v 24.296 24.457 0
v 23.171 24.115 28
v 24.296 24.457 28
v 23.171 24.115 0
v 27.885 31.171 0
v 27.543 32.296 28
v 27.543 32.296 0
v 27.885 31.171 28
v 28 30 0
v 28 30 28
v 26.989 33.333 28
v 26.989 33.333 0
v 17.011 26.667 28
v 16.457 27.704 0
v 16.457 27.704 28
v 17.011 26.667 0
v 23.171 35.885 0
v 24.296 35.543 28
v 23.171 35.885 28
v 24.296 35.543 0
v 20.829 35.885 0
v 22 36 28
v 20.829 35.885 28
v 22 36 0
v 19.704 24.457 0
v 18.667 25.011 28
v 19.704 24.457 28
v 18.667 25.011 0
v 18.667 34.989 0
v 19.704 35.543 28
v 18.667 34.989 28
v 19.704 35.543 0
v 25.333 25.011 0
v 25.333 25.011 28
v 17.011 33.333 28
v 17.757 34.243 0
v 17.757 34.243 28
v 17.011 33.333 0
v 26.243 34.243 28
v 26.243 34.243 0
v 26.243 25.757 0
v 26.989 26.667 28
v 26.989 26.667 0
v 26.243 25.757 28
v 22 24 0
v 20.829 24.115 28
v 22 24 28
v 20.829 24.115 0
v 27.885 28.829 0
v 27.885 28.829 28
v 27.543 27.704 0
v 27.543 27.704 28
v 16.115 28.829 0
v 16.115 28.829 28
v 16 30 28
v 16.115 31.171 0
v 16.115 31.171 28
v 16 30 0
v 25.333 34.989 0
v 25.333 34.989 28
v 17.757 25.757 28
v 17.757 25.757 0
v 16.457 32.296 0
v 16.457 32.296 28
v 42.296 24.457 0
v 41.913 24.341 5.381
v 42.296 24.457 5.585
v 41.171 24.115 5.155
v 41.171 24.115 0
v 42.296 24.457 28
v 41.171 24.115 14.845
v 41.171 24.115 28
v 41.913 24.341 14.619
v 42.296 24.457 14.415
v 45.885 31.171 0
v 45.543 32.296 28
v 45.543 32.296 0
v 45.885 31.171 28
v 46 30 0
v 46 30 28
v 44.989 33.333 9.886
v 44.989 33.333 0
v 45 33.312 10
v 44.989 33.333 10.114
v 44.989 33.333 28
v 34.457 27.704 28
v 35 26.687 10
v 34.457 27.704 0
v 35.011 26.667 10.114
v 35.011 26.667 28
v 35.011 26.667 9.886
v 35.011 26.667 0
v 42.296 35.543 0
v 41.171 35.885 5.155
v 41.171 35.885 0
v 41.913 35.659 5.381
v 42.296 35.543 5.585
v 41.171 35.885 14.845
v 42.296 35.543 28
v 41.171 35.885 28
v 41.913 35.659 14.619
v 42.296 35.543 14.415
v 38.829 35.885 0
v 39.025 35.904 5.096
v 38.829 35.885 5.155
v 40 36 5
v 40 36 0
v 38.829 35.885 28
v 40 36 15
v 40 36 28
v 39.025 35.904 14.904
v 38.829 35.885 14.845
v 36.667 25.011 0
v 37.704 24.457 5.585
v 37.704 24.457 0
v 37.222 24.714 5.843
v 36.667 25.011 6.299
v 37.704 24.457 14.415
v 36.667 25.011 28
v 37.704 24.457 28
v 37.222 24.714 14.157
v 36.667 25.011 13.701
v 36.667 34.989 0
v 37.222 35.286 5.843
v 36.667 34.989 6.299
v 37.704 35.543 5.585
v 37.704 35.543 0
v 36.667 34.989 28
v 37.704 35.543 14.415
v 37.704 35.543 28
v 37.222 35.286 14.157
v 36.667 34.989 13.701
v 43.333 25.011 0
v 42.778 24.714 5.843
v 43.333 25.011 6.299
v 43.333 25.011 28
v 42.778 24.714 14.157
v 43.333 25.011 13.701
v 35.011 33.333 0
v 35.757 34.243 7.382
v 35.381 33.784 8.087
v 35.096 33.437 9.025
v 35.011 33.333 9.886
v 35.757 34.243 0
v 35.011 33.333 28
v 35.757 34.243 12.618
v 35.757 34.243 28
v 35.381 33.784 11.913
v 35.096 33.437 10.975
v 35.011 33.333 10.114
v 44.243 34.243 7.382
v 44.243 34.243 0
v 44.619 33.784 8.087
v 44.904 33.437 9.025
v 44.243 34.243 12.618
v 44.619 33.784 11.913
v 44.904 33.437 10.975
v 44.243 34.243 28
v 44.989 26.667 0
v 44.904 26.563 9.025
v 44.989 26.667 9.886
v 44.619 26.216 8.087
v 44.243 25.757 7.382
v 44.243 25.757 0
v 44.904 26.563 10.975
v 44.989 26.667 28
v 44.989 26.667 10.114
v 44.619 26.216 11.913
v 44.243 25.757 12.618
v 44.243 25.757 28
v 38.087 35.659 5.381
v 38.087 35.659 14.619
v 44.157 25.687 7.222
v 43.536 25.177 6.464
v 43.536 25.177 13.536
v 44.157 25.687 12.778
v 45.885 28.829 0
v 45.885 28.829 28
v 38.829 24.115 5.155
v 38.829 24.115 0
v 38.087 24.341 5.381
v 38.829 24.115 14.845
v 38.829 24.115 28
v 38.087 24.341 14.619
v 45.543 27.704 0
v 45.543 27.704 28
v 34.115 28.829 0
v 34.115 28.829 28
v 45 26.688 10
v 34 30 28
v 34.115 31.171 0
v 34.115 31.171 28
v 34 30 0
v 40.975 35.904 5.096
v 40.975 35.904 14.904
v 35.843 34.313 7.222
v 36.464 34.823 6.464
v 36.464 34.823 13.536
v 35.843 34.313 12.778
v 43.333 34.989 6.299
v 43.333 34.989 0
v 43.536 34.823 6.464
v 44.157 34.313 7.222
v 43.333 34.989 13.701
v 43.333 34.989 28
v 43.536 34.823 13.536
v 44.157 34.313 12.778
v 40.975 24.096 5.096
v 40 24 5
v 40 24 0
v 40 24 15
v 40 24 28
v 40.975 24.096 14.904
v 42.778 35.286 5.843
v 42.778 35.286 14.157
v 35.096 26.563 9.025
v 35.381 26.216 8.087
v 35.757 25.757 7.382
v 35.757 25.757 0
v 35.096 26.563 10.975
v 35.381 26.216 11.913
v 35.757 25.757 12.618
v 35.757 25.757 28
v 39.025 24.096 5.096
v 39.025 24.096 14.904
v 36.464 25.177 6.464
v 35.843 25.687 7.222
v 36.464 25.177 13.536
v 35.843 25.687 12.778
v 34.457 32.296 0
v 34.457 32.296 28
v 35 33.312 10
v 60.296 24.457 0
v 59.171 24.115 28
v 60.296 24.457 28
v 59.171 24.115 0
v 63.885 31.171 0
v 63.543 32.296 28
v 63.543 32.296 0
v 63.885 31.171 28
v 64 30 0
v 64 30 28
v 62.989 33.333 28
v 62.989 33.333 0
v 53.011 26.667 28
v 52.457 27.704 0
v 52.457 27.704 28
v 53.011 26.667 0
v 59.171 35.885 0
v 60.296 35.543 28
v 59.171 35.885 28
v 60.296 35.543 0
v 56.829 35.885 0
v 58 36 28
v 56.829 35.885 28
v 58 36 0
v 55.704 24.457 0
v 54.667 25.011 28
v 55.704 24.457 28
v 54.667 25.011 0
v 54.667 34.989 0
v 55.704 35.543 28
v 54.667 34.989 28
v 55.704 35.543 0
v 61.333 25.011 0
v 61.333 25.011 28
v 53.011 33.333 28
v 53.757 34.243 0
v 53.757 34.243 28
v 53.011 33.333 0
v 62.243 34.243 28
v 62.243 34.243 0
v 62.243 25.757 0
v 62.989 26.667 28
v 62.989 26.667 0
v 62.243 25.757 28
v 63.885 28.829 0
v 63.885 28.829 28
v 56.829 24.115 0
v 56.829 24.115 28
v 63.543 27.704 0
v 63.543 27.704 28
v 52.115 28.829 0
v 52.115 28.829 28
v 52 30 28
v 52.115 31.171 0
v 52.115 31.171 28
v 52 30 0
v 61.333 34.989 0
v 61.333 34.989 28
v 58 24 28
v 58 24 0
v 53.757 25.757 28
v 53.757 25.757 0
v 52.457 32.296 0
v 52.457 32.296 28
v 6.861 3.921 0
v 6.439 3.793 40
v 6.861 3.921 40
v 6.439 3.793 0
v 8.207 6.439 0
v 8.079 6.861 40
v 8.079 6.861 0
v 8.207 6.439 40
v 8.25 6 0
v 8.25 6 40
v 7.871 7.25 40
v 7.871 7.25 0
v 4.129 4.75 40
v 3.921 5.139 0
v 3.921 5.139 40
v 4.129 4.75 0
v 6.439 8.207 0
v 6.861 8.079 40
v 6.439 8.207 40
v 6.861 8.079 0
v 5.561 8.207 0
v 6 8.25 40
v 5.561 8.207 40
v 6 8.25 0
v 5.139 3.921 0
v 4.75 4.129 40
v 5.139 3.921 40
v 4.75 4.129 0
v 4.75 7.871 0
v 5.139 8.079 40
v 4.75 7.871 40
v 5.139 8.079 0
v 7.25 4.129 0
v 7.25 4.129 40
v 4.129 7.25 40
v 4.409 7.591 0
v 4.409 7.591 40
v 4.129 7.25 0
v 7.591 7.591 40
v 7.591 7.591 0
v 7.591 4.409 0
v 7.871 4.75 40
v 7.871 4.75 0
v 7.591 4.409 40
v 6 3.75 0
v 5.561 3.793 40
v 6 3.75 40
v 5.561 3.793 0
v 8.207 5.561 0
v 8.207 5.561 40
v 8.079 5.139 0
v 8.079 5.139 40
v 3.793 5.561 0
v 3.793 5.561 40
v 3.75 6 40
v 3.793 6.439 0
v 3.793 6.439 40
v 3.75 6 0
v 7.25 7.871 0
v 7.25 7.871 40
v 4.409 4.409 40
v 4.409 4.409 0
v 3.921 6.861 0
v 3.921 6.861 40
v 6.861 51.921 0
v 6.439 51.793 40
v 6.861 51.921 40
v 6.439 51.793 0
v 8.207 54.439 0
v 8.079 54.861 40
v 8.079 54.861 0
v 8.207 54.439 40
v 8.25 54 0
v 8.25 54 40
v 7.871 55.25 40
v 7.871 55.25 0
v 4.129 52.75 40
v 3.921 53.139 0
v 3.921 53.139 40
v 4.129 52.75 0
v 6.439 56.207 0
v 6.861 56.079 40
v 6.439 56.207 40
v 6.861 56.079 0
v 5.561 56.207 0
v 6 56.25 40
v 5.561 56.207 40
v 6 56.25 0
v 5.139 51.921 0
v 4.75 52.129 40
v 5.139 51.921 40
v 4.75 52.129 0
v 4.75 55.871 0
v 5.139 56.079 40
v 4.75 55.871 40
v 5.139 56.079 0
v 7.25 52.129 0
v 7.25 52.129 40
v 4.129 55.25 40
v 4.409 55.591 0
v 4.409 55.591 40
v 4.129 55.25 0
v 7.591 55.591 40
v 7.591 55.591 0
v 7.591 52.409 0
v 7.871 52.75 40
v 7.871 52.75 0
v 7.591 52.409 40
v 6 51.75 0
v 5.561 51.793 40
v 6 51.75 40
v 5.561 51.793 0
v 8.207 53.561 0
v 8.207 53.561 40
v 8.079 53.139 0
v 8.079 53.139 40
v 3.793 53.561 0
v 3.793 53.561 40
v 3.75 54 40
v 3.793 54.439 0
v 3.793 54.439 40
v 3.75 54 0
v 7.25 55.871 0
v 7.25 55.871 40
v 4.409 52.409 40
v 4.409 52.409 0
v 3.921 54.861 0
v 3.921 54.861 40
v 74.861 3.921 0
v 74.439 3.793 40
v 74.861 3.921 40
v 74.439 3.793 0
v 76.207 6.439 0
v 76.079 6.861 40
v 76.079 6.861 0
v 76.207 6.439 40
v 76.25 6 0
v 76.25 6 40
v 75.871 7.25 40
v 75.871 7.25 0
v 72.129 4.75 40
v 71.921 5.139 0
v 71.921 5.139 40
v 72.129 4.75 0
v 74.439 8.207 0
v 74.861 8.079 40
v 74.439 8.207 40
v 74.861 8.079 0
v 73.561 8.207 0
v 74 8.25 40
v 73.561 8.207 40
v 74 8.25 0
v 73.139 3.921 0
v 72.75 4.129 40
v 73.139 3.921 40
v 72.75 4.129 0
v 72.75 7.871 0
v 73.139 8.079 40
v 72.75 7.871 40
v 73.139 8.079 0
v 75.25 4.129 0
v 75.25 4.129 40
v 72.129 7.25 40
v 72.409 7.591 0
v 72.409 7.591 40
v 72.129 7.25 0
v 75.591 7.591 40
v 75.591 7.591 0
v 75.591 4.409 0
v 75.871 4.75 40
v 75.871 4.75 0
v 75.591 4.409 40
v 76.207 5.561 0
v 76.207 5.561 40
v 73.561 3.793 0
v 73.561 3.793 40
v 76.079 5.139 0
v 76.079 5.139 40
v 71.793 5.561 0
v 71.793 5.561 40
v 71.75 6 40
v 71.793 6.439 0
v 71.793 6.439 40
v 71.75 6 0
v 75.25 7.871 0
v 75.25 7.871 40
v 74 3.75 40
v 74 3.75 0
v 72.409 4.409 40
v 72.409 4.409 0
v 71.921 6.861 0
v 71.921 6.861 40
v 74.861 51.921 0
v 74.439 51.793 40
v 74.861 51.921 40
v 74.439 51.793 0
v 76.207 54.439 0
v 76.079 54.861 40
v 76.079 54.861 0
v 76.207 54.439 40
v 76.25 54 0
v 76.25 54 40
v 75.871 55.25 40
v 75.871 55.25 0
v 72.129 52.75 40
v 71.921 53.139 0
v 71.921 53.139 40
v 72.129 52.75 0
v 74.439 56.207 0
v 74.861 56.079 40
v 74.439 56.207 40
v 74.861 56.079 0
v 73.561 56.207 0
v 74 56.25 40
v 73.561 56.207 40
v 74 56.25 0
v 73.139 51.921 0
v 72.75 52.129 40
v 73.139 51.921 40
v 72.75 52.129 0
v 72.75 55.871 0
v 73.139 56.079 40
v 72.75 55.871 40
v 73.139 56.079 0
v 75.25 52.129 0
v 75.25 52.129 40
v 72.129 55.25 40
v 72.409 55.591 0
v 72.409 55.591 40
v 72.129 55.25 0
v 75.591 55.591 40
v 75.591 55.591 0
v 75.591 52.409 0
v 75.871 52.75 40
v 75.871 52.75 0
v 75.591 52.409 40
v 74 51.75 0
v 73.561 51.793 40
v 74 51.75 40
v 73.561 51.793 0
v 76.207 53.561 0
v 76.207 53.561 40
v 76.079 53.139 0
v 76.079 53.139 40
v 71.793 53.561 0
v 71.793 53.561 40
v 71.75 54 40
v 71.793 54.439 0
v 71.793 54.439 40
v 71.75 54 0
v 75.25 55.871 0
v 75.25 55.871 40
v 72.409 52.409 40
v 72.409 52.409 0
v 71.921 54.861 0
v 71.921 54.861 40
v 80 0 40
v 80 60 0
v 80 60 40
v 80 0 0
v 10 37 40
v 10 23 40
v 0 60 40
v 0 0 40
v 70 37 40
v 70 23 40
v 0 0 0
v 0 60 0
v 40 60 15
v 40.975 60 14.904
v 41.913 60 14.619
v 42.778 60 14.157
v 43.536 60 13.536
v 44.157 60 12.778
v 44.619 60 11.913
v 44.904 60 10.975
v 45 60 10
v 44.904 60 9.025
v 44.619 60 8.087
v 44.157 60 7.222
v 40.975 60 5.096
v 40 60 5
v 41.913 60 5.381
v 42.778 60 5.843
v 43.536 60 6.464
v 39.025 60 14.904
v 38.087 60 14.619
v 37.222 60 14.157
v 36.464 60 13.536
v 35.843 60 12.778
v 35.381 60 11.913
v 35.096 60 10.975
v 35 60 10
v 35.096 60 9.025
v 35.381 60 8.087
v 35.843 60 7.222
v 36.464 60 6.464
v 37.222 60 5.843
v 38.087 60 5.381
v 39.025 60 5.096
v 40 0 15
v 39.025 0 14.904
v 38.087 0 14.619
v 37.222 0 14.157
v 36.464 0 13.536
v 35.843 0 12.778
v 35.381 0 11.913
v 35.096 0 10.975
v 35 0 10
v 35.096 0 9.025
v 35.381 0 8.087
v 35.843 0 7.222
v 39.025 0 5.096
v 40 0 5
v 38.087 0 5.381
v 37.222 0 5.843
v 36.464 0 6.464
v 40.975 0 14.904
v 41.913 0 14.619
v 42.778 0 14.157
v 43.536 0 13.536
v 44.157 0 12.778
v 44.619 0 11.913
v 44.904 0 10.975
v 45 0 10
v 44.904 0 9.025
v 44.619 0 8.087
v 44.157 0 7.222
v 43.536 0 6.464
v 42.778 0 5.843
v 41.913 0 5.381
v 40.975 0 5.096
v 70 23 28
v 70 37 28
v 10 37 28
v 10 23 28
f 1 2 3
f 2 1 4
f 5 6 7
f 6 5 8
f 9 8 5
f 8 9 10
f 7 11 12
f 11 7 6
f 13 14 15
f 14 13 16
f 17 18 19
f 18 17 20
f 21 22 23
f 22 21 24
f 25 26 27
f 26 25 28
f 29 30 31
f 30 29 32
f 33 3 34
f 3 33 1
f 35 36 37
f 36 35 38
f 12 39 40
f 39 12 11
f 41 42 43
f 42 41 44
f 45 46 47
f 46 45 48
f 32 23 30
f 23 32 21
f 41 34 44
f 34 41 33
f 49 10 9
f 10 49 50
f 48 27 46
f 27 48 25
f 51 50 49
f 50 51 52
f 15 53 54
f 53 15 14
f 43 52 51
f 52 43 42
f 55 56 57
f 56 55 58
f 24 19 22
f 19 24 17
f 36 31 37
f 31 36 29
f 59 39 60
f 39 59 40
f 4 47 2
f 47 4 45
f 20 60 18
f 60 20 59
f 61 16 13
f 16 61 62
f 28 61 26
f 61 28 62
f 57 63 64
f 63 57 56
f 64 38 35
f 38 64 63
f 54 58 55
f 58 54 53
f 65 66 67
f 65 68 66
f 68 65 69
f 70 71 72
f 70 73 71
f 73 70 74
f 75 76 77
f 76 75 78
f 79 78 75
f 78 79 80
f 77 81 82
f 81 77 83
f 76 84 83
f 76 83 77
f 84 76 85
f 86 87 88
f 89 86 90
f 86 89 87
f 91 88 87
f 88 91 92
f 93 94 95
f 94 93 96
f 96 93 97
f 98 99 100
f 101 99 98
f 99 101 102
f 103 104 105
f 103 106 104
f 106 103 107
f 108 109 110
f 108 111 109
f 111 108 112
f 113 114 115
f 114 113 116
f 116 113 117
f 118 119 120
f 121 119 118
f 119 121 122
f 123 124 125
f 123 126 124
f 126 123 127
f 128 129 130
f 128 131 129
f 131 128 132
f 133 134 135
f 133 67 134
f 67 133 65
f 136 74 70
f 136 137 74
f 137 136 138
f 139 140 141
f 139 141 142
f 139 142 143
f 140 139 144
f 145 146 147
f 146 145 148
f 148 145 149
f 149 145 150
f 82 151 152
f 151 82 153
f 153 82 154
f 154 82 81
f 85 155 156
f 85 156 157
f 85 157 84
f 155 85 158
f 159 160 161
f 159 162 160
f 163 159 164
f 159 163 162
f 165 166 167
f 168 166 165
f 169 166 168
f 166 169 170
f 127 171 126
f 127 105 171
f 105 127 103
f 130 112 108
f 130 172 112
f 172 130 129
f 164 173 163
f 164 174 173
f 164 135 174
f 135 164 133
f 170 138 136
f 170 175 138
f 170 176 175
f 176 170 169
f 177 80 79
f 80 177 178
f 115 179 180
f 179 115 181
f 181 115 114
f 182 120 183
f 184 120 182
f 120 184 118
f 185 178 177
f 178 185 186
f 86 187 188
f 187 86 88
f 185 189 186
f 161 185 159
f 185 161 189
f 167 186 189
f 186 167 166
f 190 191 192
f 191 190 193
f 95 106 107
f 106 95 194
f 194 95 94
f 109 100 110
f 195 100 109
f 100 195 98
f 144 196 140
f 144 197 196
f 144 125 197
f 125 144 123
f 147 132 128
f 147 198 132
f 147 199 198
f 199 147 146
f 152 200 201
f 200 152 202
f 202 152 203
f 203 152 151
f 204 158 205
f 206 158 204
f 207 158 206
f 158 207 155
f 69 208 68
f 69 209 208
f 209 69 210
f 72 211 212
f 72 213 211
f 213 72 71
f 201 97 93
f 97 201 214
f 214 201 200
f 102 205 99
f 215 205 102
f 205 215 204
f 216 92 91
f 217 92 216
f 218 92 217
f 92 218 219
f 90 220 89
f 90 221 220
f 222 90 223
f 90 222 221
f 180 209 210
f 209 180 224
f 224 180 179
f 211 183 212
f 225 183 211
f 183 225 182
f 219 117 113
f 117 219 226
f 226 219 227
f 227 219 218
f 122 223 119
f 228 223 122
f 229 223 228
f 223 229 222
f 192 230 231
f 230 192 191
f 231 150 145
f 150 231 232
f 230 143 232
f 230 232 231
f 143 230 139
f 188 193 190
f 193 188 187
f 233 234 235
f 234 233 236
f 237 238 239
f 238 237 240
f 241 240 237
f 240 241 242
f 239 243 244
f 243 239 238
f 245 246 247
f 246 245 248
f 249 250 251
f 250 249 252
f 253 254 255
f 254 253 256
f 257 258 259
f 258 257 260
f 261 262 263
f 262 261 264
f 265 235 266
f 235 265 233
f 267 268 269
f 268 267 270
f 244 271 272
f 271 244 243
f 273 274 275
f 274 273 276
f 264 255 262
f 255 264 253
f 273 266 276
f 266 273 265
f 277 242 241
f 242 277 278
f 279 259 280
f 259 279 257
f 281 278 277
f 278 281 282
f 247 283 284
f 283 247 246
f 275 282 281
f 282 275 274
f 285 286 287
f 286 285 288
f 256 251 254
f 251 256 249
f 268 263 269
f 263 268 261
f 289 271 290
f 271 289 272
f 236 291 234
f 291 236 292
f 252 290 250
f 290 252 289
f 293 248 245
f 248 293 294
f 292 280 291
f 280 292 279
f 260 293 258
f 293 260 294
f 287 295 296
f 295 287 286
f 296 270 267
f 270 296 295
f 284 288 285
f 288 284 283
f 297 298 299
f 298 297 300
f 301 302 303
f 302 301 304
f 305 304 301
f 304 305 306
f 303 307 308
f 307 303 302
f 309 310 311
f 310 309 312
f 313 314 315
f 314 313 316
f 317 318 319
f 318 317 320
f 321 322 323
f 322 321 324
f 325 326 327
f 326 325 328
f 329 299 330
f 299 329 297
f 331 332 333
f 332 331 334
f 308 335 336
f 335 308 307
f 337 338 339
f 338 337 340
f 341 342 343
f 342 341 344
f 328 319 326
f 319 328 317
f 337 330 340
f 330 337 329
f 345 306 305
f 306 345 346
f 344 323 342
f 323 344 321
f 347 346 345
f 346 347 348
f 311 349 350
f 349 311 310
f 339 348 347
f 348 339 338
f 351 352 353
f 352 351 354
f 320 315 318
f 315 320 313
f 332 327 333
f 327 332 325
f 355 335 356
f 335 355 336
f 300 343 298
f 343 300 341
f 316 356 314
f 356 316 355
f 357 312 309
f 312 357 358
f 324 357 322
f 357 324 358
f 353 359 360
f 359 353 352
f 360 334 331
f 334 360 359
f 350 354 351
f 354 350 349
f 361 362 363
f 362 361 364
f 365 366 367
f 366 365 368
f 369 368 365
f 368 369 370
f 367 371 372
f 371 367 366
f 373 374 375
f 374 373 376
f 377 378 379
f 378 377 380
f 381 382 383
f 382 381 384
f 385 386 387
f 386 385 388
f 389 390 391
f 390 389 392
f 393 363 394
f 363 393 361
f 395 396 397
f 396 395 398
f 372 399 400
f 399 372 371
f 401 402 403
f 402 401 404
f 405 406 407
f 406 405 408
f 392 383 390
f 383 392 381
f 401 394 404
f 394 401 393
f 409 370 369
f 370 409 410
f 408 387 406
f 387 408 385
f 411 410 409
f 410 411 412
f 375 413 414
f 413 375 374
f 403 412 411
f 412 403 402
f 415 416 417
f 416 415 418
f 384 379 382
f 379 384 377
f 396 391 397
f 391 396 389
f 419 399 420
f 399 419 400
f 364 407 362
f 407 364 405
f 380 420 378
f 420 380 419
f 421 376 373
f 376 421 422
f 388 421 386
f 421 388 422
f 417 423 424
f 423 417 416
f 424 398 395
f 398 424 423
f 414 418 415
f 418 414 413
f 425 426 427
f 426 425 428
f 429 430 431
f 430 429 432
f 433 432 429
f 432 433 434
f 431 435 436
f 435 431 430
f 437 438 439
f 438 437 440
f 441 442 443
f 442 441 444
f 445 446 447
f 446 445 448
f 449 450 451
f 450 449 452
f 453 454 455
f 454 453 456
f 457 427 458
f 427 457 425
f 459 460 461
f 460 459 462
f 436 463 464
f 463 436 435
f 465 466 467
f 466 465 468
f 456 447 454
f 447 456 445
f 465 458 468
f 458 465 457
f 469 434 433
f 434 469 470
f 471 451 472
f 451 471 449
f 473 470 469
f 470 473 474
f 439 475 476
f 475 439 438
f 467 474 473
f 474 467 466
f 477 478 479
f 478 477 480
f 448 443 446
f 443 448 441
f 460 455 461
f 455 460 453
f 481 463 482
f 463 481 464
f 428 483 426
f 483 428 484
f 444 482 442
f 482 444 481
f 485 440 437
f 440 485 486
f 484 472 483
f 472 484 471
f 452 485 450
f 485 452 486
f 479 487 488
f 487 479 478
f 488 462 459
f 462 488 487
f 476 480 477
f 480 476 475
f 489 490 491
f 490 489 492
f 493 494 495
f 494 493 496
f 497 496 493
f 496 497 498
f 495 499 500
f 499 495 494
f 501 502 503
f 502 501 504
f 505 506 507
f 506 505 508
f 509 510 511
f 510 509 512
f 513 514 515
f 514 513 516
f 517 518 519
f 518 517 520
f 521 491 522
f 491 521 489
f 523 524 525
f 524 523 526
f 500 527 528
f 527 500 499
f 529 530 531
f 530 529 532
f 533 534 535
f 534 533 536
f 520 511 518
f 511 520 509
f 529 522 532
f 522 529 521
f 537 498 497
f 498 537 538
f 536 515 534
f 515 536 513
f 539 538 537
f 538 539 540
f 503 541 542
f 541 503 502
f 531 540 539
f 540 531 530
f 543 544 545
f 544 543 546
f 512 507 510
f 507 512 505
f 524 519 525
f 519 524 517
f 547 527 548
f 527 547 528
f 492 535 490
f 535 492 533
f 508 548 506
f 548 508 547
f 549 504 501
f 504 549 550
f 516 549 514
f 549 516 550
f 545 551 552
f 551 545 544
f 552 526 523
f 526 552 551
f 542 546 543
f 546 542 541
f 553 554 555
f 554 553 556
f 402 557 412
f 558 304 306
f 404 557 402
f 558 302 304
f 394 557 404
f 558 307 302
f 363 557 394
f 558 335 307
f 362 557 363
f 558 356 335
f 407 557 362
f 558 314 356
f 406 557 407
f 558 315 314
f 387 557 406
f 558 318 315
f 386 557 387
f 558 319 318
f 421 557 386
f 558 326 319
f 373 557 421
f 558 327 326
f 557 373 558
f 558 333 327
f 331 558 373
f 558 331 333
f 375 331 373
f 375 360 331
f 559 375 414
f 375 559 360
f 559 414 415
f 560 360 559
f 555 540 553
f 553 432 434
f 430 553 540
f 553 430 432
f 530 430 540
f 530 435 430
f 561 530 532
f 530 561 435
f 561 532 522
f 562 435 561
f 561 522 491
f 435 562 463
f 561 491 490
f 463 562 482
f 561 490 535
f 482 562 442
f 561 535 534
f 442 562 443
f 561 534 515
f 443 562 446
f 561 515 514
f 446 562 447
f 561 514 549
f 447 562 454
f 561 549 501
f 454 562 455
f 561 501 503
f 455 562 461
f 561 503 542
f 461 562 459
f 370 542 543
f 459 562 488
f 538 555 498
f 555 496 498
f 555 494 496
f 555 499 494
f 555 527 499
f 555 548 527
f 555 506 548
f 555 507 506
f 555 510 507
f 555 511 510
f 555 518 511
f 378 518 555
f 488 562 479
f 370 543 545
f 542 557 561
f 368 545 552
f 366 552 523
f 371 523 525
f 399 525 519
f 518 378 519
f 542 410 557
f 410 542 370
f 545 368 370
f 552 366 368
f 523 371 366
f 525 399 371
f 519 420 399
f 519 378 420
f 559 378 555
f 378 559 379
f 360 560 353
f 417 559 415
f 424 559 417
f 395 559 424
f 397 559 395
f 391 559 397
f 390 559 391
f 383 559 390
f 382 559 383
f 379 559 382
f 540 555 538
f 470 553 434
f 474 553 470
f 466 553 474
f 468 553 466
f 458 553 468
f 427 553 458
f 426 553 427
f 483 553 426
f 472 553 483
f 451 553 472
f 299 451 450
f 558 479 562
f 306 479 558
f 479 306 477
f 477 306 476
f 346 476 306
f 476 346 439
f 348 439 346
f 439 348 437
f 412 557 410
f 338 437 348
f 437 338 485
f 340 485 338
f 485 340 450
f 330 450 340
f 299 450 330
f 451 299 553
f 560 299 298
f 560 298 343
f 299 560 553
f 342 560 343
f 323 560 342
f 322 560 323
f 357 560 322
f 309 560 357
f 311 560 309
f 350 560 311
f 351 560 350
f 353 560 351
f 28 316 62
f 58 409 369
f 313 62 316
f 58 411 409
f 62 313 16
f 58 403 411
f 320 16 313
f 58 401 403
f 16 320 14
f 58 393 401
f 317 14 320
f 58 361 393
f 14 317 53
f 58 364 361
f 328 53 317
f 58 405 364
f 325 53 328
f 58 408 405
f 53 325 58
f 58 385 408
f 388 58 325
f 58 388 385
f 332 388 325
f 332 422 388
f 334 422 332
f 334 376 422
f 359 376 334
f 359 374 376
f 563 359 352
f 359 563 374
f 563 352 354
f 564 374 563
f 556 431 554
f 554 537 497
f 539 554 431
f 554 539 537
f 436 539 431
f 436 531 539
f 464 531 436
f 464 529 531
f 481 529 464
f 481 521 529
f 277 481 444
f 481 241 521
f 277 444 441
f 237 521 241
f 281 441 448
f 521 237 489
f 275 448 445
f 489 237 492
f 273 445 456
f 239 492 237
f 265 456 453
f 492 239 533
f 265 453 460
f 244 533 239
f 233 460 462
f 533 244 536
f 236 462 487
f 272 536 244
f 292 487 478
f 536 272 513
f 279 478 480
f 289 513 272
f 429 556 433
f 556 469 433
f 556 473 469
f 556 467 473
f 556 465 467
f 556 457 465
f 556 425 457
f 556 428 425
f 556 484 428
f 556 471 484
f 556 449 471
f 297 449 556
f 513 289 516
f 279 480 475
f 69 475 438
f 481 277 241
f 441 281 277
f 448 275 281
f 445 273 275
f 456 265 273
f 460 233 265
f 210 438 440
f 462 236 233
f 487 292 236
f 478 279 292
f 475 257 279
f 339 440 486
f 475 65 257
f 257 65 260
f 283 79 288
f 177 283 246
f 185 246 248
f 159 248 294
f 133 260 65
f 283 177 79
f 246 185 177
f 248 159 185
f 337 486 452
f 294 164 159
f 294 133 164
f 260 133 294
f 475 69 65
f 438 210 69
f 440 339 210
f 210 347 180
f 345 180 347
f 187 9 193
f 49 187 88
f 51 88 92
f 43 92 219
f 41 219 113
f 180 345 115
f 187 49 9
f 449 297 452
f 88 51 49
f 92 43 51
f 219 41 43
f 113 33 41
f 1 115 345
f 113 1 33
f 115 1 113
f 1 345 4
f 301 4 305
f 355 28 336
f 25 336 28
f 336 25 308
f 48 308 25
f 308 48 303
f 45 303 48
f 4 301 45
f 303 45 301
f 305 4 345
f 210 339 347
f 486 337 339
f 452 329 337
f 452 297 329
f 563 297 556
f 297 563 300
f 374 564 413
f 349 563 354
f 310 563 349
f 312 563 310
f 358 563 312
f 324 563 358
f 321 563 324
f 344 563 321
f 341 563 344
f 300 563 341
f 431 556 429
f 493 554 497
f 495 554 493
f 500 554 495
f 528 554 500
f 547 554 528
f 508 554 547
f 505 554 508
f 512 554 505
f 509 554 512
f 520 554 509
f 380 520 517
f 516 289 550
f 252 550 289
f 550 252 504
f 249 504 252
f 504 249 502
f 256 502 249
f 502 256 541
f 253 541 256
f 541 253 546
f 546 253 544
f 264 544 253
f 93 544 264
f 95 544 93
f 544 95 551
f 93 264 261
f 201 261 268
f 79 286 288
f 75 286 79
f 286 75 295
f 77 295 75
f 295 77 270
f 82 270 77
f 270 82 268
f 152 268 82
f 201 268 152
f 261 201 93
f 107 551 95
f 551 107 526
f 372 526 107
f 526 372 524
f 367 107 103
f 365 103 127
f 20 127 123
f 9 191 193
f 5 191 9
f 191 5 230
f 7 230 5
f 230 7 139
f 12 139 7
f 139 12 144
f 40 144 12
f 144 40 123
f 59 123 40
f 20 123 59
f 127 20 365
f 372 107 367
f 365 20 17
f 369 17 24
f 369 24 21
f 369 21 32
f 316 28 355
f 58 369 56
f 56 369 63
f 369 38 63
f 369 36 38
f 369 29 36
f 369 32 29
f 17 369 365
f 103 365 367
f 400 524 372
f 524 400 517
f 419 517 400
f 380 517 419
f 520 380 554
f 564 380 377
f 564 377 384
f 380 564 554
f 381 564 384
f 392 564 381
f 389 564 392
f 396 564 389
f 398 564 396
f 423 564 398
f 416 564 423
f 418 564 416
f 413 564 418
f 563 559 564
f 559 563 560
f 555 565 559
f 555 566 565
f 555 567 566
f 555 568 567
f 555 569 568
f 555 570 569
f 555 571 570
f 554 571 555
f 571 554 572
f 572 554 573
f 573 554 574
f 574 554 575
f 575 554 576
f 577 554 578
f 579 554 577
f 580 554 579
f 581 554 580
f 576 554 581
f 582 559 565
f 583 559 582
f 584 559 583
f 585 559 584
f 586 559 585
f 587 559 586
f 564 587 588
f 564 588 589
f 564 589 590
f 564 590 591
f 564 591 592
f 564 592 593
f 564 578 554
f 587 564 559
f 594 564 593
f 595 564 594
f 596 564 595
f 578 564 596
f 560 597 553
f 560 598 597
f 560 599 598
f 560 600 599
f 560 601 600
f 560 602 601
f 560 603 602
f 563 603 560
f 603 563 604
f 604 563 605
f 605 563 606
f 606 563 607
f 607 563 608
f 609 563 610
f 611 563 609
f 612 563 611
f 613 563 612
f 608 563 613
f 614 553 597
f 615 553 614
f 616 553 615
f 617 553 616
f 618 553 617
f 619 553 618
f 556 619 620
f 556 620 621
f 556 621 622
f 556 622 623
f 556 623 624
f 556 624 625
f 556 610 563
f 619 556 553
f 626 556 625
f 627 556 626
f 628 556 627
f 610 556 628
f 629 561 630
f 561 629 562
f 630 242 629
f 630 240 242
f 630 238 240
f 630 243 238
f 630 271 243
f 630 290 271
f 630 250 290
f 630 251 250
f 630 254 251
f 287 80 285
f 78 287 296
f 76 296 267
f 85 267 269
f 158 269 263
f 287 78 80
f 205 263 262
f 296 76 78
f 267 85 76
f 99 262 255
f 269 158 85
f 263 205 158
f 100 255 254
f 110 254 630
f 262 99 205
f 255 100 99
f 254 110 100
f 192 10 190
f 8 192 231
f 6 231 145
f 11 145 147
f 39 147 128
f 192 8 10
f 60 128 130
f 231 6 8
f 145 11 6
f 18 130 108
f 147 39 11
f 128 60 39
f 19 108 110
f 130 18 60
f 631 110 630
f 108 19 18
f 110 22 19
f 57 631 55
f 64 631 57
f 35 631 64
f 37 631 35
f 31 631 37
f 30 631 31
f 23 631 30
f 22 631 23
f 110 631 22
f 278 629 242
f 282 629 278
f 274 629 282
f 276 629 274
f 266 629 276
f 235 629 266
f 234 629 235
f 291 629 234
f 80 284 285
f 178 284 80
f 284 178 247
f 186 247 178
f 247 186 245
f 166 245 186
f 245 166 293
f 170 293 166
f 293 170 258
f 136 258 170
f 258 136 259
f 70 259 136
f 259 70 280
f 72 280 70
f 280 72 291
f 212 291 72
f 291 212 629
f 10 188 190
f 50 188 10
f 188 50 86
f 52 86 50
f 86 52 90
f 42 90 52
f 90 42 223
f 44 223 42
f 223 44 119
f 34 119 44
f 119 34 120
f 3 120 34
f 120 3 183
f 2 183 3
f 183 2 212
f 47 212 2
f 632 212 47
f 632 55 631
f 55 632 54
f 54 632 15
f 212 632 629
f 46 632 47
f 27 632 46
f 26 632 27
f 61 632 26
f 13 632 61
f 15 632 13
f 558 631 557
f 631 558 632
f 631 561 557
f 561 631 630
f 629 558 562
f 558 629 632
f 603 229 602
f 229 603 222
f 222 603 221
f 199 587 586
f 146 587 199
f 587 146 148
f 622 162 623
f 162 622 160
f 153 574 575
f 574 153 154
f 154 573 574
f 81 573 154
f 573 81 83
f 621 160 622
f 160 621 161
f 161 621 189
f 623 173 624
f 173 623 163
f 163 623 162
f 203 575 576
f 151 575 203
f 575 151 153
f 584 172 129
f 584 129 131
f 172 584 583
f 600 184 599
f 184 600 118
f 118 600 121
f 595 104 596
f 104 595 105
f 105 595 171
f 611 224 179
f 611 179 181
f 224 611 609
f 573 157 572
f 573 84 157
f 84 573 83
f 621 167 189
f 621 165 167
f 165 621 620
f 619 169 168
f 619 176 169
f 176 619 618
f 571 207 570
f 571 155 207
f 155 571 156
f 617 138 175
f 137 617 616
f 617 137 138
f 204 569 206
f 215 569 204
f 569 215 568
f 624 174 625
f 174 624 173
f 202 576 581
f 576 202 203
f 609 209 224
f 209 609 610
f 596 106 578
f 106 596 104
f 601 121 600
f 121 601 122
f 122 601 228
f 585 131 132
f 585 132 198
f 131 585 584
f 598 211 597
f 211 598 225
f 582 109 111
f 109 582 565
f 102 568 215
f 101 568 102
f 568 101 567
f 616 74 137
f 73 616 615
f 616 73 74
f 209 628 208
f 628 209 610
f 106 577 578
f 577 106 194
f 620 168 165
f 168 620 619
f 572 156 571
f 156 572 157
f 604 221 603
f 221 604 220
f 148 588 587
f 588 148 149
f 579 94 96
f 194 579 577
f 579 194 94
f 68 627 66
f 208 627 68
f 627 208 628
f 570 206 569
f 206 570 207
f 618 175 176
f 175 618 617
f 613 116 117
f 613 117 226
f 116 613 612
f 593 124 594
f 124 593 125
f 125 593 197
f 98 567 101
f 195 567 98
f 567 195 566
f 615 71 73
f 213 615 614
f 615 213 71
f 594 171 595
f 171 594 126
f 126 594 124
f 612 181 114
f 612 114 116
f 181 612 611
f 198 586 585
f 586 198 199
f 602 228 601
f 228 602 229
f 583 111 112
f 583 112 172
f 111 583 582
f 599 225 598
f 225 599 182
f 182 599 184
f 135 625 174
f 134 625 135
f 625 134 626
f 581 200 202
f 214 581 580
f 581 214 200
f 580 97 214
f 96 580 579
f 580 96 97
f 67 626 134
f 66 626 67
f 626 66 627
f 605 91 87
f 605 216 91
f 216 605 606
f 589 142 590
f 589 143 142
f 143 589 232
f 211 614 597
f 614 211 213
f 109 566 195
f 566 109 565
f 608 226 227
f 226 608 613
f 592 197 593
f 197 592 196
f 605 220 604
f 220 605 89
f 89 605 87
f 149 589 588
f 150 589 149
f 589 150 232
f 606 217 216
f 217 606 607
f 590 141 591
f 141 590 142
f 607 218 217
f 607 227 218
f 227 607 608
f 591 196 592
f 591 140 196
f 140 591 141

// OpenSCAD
$fn = 32;

// ----------------------------------------------------------------------
// Manifold block: side_outlet manifold
// ----------------------------------------------------------------------

// --- parameters (mm) ---
block_l = 80;             // block length, X
block_w = 60;             // block width, Y
block_h = 40;             // block height, Z
port_d = 12;              // port bore diameter
port_pitch = 18;          // port pitch along X
gallery_d = 14;           // top gallery width, Y
gallery_depth = 12;       // gallery pocket depth
wall_p = 10;              // gallery end wall thickness, X
mnt_d = 4.5;              // mounting hole diameter
mnt_in = 6;               // mounting hole inset from the edges
out_d = 10;               // outlet bore diameter
out_z = 10;               // outlet axis height

n_ports = 3;  // ports in the row
port_x0 = (block_l - (n_ports - 1) * port_pitch) / 2;  // first port X

difference() {
  cube([block_l, block_w, block_h]);
  for (i = [0 : n_ports - 1])
    translate([port_x0 + i * port_pitch, block_w / 2, -1])
      cylinder(h = block_h + 2, d = port_d);
  translate([wall_p, block_w / 2 - gallery_d / 2, block_h - gallery_depth])
    cube([block_l - 2 * wall_p, gallery_d, gallery_depth + 1]);
  for (cx = [mnt_in, block_l - mnt_in])
    for (cy = [mnt_in, block_w - mnt_in])
      translate([cx, cy, -1]) cylinder(h = block_h + 2, d = mnt_d);
  translate([block_l / 2, -1, out_z]) rotate([-90, 0, 0])
    cylinder(h = block_w + 2, d = out_d);
}
